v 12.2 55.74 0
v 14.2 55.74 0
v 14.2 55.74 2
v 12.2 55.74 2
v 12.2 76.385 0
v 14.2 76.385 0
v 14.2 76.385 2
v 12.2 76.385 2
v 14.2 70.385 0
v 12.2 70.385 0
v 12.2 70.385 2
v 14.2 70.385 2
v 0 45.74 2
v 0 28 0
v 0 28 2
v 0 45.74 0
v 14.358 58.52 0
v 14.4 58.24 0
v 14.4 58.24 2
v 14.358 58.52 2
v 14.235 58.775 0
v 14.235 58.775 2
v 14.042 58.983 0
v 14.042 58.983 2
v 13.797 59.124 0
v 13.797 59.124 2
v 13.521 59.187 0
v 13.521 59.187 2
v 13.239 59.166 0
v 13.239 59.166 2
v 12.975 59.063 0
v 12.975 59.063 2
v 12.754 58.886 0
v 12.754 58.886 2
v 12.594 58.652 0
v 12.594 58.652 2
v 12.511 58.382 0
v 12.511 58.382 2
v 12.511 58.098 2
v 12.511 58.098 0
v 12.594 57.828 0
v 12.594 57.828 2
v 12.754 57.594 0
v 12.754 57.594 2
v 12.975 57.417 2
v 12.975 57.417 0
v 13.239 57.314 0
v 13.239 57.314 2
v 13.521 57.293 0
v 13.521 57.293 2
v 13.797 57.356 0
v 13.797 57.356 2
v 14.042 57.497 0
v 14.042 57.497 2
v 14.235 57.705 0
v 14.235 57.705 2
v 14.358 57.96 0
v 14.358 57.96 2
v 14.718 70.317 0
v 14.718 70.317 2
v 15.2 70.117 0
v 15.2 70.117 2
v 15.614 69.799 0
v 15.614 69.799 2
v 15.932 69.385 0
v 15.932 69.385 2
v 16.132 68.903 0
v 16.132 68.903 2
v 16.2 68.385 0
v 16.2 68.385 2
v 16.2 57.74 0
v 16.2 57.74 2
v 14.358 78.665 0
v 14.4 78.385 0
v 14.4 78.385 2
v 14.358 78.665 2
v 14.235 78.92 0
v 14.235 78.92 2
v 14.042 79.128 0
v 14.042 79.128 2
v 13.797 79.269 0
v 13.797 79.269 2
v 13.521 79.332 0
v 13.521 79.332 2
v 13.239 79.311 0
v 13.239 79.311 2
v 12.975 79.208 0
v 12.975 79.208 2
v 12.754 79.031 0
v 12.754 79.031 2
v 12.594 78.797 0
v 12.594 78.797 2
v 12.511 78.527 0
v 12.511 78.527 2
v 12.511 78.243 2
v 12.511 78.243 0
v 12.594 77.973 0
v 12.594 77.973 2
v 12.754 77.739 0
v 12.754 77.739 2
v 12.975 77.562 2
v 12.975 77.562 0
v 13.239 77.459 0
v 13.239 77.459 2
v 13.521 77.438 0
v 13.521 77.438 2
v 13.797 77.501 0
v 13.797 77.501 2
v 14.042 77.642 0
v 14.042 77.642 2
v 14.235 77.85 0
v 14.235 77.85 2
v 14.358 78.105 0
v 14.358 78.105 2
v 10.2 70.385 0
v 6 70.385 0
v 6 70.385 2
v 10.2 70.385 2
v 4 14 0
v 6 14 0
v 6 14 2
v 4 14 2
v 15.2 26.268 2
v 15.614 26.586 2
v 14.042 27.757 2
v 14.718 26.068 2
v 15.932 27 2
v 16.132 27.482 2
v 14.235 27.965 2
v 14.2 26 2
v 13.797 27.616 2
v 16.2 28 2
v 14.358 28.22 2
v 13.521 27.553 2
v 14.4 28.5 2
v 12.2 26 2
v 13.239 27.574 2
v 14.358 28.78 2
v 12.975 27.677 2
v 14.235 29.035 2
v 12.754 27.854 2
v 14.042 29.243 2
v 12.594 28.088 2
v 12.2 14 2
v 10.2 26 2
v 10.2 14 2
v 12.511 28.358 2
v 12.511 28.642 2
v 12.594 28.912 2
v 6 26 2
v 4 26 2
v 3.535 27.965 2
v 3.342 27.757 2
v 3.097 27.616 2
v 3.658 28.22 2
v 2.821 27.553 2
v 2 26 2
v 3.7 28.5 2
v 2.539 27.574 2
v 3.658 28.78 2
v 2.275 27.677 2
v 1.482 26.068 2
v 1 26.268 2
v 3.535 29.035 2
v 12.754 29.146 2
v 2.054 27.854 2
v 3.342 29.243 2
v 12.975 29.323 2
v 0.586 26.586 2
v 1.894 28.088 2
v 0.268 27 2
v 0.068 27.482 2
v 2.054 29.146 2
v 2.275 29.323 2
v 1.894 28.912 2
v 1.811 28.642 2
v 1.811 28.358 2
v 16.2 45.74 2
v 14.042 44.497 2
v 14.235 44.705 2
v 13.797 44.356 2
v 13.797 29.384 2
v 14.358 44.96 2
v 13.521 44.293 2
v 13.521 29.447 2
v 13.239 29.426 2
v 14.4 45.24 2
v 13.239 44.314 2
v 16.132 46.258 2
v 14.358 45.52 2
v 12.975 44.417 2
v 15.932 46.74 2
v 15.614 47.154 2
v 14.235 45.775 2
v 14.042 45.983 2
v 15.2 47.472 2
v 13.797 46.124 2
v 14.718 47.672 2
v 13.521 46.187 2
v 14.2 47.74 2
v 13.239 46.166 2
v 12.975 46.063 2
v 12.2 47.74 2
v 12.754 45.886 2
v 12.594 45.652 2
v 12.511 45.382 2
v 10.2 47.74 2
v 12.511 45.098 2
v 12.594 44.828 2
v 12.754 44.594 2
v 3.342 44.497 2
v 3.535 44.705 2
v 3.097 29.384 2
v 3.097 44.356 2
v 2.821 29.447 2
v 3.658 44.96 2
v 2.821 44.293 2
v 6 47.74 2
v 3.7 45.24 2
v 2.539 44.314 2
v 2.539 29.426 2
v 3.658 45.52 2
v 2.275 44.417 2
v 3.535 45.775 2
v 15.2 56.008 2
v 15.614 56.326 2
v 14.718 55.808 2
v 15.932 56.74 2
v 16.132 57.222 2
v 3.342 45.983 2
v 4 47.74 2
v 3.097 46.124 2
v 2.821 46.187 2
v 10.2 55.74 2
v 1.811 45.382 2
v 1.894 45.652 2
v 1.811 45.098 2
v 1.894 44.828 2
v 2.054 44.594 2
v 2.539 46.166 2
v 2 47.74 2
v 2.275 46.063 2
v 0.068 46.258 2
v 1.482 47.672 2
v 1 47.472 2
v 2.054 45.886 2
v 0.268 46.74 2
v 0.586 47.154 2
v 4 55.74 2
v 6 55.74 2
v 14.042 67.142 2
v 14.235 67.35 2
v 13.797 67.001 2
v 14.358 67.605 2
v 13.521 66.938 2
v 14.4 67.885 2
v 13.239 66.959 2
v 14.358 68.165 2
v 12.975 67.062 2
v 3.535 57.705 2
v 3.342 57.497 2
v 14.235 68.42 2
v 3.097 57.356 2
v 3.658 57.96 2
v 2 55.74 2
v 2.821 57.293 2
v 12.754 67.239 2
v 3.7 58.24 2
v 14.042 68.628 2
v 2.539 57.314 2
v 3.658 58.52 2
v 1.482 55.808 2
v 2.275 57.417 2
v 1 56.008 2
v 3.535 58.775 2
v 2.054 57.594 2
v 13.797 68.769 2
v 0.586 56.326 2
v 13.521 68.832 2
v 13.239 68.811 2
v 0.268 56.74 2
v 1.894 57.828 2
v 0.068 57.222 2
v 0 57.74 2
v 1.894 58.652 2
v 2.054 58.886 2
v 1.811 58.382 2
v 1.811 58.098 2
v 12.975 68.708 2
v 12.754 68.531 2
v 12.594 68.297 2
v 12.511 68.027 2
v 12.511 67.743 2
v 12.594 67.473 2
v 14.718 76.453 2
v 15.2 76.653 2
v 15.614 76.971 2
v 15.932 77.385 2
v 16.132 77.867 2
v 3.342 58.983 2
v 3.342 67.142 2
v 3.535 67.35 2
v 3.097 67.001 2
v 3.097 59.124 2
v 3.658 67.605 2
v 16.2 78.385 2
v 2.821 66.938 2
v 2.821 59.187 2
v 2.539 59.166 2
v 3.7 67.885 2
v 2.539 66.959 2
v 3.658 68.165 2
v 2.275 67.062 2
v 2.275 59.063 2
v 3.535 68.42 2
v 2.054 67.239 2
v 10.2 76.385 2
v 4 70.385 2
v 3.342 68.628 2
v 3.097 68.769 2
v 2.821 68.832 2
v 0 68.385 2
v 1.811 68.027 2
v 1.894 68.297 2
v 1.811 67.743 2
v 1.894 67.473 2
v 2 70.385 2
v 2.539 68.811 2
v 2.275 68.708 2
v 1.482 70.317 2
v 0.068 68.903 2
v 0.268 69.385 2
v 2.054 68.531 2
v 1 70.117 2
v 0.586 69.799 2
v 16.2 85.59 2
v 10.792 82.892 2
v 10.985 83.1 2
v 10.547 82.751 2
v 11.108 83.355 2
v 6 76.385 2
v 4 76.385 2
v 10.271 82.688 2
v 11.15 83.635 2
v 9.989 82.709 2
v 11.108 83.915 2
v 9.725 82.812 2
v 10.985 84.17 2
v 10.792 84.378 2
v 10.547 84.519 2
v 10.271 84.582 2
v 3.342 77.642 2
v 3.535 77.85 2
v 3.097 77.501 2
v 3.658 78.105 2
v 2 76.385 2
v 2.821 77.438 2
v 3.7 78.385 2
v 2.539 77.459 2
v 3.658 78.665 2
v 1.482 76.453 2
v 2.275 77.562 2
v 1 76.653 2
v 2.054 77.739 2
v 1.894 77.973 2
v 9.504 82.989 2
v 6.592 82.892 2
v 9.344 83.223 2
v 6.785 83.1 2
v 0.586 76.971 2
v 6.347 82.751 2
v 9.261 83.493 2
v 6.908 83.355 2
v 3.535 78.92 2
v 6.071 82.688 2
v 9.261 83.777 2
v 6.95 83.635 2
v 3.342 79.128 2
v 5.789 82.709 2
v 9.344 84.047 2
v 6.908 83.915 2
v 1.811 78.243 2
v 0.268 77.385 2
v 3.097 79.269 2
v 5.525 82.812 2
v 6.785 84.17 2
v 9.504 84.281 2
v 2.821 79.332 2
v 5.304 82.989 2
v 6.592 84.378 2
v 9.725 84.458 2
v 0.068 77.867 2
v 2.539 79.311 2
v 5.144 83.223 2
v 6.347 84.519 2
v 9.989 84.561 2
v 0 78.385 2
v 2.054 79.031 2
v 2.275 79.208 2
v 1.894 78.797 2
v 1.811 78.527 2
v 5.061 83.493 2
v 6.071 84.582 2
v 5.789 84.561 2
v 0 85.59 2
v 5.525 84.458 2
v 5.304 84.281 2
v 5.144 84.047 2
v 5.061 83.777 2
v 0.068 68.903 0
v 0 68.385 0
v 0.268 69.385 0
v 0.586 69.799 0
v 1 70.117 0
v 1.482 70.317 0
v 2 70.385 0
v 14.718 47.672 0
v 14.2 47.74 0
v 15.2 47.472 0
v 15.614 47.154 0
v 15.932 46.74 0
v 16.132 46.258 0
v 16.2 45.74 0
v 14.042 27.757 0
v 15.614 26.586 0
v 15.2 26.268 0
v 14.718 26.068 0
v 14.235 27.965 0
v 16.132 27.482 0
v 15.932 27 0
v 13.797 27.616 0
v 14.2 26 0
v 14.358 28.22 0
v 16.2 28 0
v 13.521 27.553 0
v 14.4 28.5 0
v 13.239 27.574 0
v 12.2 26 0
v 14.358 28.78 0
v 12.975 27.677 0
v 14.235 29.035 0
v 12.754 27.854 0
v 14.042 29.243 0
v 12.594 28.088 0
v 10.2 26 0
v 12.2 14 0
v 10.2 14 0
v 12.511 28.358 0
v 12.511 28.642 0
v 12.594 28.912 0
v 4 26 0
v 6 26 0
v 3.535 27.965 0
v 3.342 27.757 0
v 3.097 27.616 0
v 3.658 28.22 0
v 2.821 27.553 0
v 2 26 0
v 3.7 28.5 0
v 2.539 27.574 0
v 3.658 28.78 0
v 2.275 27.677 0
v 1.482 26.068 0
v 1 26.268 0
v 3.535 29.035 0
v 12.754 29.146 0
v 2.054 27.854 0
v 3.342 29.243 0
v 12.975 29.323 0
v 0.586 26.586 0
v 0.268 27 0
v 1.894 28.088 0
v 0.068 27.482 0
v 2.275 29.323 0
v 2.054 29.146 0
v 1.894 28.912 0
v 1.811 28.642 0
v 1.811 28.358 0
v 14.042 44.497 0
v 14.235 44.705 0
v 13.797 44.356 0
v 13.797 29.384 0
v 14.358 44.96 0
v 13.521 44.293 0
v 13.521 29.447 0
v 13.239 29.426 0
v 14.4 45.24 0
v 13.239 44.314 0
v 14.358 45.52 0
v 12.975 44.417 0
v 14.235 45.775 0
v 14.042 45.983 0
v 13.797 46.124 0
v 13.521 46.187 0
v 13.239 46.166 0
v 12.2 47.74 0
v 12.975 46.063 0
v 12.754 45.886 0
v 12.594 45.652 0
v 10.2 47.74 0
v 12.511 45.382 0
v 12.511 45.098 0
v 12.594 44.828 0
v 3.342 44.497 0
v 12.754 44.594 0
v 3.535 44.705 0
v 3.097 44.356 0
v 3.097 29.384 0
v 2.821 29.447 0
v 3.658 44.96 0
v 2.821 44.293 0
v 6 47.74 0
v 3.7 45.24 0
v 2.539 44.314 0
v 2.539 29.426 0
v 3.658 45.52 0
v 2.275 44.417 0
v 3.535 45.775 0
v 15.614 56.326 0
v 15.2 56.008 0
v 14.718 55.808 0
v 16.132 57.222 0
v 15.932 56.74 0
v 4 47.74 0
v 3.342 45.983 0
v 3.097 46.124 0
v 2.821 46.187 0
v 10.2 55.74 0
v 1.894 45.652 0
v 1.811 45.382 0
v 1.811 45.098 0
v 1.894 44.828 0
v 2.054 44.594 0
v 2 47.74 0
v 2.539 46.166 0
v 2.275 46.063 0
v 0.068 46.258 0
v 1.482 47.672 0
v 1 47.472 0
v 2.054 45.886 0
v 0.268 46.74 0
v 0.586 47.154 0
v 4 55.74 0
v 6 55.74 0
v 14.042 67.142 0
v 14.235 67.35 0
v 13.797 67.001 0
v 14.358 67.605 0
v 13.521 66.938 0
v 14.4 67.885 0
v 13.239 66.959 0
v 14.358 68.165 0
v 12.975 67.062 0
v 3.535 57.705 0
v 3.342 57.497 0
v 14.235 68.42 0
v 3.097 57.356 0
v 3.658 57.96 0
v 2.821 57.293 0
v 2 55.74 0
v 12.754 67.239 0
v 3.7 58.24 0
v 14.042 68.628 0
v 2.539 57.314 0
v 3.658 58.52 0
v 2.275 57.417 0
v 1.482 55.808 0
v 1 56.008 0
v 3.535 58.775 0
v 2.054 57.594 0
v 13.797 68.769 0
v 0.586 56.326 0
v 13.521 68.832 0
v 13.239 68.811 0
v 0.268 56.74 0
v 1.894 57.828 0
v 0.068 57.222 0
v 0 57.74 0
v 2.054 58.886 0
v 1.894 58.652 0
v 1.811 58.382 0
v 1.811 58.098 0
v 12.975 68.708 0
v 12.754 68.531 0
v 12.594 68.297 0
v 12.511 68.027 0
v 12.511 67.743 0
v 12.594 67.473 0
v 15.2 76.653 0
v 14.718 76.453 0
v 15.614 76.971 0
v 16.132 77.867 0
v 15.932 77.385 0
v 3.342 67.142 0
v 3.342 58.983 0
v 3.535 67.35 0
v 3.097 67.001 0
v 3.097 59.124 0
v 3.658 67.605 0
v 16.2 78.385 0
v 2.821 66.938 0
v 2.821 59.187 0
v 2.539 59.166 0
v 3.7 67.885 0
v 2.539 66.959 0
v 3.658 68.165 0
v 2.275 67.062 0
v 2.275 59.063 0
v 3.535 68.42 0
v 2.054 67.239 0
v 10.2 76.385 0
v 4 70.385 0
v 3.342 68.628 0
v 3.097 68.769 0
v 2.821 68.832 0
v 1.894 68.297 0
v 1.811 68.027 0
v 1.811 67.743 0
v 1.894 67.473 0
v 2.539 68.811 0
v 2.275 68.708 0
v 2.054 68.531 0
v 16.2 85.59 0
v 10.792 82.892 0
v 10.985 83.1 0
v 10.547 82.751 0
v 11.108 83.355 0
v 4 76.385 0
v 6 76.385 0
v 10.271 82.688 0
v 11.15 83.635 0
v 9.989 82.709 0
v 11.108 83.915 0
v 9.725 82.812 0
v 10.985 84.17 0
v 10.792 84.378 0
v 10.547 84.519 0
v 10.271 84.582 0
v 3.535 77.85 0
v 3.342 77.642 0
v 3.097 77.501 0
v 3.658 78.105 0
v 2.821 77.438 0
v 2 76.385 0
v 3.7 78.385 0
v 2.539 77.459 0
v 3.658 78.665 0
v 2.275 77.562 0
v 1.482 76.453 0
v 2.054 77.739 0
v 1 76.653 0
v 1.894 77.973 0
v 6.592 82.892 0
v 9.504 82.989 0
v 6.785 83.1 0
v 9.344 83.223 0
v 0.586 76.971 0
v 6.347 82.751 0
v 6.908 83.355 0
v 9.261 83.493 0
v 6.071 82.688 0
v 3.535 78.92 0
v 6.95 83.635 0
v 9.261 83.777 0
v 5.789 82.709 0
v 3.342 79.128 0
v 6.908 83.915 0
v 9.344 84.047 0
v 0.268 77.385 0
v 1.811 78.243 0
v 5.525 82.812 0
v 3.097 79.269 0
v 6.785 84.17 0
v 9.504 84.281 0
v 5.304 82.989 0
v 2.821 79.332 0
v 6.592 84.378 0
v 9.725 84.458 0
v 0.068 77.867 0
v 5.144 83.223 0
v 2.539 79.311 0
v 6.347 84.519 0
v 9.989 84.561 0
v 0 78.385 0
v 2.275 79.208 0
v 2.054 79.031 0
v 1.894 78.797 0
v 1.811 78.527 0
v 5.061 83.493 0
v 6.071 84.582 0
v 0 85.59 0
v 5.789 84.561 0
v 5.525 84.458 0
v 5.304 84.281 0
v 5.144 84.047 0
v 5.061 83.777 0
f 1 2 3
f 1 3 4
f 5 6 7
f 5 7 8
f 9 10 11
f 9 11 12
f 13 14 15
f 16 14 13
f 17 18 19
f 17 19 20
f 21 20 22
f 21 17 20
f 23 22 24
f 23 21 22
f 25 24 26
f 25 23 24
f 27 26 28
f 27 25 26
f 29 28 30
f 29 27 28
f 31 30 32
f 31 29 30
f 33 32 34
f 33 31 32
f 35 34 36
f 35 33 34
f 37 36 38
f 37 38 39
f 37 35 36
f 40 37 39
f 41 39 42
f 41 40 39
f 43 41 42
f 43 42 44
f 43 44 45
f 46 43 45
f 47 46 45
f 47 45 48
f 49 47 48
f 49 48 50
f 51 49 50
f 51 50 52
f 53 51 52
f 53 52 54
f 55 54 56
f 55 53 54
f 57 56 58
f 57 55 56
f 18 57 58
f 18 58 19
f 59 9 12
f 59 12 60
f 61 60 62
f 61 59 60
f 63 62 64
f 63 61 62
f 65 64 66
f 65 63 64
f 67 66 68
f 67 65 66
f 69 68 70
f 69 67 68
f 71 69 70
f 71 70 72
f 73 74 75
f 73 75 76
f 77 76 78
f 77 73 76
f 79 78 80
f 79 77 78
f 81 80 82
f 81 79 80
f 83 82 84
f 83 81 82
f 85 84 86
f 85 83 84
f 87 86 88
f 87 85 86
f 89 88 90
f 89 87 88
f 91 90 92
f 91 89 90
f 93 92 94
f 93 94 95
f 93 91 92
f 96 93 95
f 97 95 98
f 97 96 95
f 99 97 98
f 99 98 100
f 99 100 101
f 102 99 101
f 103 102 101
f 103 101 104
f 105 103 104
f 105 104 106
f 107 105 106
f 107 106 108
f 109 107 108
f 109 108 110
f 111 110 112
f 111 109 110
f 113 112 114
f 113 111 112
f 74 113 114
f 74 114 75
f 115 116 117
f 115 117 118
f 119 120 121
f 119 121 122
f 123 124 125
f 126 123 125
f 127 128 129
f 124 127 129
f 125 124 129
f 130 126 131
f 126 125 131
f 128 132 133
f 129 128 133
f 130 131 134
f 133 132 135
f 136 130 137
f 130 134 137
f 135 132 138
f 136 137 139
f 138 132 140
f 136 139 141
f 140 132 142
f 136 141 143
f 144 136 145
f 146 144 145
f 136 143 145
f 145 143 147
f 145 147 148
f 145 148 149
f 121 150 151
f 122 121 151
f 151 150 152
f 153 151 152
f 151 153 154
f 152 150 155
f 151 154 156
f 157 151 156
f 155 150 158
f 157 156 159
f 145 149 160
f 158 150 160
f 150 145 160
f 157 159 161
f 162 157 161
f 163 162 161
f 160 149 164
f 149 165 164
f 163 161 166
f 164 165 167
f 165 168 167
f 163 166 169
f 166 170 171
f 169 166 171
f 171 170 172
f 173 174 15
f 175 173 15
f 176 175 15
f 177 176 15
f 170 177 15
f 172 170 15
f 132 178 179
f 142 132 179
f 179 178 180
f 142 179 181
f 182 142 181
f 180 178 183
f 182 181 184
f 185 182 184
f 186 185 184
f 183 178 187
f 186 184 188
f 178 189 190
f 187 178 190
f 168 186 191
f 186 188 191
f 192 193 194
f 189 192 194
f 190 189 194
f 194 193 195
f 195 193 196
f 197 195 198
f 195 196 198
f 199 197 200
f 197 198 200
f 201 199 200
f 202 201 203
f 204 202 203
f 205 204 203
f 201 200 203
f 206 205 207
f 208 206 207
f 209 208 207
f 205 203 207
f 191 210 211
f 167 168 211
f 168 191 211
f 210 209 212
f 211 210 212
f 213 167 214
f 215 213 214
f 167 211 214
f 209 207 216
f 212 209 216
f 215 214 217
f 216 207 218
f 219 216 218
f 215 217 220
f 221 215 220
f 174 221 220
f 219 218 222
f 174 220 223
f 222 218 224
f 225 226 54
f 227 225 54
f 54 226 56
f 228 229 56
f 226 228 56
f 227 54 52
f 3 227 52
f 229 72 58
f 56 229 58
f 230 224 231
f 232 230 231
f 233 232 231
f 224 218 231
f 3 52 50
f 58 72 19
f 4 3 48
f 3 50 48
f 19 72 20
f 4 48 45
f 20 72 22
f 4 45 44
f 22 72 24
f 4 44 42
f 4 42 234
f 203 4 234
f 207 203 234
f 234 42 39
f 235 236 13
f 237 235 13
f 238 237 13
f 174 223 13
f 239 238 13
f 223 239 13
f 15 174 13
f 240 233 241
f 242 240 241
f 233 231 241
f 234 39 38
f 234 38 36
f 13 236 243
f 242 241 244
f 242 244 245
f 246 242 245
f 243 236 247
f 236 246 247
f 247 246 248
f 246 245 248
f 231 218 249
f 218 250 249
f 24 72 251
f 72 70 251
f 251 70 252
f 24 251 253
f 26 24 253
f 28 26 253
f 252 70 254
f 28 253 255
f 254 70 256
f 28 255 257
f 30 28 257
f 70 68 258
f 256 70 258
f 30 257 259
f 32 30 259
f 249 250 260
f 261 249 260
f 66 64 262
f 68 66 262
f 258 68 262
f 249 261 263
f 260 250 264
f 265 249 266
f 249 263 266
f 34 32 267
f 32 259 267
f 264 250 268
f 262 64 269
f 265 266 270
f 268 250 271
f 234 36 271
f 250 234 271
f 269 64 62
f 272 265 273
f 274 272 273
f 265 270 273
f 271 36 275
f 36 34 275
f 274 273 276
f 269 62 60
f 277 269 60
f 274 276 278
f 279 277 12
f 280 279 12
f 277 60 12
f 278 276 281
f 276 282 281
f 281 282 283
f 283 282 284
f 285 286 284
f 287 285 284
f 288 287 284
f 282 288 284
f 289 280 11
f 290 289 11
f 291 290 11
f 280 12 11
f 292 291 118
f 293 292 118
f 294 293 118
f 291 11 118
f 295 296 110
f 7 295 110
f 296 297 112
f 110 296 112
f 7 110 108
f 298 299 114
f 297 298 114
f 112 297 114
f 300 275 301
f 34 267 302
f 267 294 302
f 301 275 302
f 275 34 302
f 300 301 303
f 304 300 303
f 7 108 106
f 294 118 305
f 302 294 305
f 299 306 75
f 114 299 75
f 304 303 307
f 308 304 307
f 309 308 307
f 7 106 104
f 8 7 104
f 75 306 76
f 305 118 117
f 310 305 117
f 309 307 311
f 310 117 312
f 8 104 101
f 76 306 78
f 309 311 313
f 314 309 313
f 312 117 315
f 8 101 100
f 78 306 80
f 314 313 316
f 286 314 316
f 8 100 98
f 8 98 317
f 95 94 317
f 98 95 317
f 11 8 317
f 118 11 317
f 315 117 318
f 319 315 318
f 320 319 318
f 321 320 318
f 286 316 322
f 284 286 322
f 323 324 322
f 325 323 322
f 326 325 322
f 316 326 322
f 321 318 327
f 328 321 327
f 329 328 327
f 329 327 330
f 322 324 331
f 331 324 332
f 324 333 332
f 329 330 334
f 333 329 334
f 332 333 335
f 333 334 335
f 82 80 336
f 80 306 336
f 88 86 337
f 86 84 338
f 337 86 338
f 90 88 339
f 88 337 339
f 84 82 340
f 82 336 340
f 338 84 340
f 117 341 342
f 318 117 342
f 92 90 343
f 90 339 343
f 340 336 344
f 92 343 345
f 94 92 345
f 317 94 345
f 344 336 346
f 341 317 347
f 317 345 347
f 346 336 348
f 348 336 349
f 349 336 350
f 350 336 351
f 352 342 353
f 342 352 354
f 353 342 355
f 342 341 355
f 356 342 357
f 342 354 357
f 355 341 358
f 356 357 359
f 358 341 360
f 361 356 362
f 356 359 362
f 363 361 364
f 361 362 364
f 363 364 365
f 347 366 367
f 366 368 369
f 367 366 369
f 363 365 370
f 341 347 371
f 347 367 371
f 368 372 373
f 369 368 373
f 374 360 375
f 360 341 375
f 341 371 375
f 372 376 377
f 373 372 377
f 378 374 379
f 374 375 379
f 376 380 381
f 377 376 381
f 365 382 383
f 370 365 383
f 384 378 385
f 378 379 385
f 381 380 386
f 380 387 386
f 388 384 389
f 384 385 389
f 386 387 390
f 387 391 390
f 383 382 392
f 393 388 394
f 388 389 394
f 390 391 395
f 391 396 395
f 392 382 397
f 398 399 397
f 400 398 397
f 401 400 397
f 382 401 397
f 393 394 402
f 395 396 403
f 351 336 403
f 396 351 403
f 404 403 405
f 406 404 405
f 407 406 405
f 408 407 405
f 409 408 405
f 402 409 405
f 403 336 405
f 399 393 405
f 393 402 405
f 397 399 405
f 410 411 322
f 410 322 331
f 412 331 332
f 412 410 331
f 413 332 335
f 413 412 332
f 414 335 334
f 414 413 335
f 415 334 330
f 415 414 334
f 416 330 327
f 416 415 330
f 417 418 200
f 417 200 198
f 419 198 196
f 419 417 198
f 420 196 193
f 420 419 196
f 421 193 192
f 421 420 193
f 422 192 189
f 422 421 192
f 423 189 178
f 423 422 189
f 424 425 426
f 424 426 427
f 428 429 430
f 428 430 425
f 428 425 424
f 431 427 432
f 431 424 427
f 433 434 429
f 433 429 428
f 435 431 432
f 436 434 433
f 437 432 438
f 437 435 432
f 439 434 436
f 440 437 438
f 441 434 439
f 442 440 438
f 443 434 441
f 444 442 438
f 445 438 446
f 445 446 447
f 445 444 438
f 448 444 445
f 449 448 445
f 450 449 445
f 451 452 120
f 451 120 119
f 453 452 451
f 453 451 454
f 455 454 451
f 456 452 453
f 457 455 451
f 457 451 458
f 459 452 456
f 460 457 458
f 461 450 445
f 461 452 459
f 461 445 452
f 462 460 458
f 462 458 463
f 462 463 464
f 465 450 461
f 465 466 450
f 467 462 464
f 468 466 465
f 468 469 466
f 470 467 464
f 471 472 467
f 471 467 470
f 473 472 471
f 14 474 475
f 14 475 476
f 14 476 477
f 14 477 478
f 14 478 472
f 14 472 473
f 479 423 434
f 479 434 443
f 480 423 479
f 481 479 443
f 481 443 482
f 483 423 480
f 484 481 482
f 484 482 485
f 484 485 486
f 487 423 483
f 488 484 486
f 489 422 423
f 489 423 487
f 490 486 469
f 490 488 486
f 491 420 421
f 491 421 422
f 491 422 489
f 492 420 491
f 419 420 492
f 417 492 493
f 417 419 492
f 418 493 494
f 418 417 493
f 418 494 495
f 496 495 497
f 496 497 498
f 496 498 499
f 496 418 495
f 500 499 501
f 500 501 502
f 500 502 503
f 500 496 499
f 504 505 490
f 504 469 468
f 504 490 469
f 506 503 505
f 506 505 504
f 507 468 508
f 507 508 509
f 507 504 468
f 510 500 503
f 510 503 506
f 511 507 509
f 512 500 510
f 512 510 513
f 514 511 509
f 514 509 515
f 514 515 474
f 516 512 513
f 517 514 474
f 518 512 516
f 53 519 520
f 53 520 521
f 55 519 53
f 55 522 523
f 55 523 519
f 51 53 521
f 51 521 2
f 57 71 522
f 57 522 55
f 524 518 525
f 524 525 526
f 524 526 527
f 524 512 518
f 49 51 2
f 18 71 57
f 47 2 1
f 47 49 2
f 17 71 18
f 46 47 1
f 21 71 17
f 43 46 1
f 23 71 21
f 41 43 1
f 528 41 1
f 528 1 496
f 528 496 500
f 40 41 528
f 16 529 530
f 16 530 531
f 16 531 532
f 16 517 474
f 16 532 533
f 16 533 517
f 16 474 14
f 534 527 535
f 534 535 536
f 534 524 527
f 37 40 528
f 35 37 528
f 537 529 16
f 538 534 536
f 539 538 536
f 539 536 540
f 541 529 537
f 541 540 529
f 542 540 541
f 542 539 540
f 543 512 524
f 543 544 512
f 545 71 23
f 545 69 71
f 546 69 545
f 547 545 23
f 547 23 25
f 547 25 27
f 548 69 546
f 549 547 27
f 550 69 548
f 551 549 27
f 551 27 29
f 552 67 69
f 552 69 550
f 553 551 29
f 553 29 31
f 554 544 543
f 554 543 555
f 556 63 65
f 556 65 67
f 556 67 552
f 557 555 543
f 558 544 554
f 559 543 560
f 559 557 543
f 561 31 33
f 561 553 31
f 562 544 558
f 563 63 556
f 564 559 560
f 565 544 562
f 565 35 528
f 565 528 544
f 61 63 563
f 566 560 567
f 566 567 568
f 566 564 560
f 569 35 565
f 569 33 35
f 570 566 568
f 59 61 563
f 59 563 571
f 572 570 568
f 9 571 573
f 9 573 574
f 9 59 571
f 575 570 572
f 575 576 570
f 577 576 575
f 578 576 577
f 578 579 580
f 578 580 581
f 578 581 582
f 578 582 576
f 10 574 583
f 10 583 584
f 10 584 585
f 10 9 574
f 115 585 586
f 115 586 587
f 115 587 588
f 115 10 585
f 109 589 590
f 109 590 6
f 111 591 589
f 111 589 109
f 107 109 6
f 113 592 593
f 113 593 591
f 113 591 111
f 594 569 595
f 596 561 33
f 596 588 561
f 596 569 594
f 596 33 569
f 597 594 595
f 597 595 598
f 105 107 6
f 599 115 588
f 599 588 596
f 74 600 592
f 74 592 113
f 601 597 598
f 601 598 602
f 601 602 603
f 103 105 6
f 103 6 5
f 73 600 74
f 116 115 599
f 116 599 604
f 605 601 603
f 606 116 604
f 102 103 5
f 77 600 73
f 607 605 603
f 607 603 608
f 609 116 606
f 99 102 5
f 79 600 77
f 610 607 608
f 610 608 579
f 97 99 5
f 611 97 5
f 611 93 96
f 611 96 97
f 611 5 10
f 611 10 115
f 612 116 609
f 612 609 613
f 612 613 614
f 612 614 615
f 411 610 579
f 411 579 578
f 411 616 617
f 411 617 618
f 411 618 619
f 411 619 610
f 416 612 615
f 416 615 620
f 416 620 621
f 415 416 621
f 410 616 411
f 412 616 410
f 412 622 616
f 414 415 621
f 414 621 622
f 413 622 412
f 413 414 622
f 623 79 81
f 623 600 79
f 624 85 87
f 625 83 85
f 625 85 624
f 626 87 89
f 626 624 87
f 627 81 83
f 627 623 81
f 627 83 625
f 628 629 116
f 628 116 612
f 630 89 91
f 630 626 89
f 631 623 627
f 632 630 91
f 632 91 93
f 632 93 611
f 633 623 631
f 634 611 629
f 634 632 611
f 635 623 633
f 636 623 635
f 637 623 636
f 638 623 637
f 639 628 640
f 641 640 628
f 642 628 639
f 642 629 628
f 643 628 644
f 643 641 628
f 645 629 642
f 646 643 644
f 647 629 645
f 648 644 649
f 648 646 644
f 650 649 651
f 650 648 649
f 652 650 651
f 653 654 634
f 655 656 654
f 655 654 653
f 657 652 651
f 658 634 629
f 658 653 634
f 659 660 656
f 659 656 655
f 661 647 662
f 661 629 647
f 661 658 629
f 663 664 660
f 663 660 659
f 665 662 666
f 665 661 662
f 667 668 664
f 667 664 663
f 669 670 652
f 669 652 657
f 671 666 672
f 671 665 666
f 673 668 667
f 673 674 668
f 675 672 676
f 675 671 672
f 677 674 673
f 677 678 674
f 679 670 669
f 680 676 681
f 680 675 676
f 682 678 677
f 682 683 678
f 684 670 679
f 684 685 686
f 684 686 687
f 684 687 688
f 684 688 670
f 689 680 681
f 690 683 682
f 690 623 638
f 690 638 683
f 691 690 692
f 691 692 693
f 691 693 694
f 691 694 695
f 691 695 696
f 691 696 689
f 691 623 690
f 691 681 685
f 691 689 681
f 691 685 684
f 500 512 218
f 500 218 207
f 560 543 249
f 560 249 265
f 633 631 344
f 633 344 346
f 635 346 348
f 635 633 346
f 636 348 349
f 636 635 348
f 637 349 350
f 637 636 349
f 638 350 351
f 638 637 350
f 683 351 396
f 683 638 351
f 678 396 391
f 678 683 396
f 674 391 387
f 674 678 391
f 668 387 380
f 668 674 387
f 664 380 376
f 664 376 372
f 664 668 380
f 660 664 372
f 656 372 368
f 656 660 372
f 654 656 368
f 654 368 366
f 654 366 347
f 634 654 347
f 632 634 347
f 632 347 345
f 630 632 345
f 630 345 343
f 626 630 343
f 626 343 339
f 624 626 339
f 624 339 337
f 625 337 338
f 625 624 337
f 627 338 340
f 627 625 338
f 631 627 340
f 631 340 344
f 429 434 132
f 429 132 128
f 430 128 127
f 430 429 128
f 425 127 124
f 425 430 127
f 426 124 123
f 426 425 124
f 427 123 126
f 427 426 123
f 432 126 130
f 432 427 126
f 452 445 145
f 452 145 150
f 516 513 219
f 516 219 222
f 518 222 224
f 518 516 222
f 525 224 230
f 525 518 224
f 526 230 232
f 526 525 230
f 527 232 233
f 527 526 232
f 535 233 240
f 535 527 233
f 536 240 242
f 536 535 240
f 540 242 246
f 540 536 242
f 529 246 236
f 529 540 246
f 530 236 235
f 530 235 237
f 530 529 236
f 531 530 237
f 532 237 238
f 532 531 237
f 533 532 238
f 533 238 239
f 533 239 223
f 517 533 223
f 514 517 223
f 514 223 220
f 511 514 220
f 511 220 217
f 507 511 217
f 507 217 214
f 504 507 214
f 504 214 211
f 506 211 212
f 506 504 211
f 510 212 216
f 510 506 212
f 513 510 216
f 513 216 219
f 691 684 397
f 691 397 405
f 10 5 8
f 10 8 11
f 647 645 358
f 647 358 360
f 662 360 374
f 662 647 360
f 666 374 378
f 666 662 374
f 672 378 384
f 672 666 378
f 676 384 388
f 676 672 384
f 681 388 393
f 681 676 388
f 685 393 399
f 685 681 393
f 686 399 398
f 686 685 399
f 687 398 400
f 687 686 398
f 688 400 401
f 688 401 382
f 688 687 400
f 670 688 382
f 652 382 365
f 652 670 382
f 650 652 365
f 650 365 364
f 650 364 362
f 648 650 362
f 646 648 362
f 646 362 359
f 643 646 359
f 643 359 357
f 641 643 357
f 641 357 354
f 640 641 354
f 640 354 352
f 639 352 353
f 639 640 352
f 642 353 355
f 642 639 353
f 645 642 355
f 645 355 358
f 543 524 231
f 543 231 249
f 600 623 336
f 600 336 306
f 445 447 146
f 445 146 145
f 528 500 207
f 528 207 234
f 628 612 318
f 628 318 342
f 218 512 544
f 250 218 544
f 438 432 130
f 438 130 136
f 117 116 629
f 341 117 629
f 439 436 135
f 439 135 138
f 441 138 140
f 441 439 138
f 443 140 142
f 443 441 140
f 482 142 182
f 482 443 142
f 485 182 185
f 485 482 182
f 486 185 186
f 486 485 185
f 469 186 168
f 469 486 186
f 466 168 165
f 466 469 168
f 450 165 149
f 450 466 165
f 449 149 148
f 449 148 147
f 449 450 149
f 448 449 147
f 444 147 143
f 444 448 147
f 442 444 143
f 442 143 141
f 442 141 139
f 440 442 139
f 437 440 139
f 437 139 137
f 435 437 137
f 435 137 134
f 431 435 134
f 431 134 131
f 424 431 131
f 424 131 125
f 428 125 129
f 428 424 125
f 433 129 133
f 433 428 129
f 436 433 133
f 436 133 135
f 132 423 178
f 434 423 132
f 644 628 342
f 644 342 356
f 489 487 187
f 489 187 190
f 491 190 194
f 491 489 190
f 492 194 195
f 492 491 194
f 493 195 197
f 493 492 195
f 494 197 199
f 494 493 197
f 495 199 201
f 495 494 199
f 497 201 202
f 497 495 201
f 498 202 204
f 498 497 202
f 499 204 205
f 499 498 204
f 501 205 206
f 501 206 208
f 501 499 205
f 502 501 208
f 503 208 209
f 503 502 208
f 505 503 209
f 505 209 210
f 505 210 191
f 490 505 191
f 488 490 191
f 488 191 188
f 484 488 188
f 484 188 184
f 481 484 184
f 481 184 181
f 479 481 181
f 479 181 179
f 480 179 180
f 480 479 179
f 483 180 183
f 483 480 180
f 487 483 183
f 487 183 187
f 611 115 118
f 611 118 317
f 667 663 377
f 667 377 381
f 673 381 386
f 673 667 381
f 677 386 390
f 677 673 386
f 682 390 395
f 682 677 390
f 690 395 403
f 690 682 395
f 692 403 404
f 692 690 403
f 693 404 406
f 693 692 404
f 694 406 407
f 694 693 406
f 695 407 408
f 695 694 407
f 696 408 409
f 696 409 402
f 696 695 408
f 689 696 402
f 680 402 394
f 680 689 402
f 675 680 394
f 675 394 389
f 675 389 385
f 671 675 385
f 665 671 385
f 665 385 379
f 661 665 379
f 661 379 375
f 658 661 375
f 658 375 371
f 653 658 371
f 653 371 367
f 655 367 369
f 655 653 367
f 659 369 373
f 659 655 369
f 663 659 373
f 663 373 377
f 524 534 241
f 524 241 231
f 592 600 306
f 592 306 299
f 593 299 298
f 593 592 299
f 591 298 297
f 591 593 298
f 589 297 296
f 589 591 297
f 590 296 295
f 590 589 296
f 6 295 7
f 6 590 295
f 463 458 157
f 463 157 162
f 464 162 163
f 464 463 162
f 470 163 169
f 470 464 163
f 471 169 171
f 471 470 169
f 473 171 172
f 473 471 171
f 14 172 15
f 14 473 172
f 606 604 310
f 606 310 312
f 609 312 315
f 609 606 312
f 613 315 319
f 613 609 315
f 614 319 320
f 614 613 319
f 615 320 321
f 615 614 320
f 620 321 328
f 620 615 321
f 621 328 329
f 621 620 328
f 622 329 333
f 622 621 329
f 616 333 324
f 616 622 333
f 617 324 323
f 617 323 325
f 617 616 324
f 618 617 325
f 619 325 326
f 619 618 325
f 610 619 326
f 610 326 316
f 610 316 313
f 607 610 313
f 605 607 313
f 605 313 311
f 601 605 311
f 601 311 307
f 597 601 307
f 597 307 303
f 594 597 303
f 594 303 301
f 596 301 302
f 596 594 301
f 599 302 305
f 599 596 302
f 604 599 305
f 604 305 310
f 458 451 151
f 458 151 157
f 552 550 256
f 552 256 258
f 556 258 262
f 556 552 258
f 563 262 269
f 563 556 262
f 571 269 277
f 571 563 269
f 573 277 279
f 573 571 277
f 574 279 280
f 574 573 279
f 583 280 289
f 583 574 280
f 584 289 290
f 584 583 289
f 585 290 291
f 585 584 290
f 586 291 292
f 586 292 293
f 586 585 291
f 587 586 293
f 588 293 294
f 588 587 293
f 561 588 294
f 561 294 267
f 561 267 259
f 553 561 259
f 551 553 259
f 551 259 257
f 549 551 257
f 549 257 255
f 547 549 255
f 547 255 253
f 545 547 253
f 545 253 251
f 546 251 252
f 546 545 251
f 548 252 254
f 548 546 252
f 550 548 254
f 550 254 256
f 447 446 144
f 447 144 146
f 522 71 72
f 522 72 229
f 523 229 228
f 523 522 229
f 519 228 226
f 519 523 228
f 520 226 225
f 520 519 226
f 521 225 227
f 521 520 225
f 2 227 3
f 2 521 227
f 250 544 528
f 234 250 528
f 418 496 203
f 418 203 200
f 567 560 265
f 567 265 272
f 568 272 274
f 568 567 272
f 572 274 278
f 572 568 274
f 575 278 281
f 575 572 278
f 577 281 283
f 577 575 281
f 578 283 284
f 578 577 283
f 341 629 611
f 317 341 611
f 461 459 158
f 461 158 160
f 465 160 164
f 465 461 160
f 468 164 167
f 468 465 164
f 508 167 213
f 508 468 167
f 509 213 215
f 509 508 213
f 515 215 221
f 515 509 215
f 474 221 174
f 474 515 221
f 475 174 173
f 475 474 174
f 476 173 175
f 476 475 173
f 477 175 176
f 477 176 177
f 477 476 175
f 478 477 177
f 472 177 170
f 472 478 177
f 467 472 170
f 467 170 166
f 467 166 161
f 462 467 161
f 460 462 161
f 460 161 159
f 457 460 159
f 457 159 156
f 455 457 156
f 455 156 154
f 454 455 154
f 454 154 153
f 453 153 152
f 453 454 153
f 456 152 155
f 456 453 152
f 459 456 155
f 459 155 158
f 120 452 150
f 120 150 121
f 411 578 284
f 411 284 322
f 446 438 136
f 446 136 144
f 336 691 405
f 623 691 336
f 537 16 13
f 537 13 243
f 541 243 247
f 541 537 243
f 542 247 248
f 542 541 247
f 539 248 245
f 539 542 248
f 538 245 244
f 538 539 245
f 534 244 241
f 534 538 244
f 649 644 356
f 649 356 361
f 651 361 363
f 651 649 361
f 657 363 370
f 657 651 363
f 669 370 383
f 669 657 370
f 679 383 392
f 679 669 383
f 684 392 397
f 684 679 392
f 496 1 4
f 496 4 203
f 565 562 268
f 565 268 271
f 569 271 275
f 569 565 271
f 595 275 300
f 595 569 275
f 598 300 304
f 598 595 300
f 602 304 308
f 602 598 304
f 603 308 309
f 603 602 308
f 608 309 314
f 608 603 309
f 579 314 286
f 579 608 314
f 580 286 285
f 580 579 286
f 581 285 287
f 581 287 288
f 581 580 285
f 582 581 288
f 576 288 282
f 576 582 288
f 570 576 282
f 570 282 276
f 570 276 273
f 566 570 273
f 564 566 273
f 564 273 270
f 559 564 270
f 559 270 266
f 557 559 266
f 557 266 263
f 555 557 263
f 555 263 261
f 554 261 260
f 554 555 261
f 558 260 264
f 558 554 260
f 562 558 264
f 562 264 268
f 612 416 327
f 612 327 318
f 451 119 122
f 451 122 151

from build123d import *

# Parameters (mm, degrees)
SKETCH1_R           = 0.95
SKETCH1_W           = 4.2
SKETCH1_H           = 6
SKETCH1_H_2         = 8
BOSS_EXTRUDE1_DEPTH = 2


with BuildPart() as part:
    # Sketch1 → Boss-Extrude1 (new body)
    with BuildSketch(Plane.XY):
        with BuildLine():
            Line((2, 47.74), (4, 47.74))
            Line((4, 47.74), (4, 55.74))
            Line((4, 55.74), (2, 55.74))
            ThreePointArc((2, 55.74), (0.585786438, 56.325786438), (0, 57.74))
            Line((0, 57.74), (0, 68.385))
            ThreePointArc((0, 68.385), (0.585786438, 69.799213562), (2, 70.385))
            Line((2, 70.385), (4, 70.385))
            Line((4, 70.385), (4, 76.385))
            Line((4, 76.385), (2, 76.385))
            ThreePointArc((2, 76.385), (0.585786438, 76.970786438), (0, 78.385))
            Line((0, 78.385), (0, 85.59))
            Line((0, 85.59), (16.2, 85.59))
            Line((16.2, 85.59), (16.2, 78.385))
            ThreePointArc((16.2, 78.385), (15.614213562, 76.970786438), (14.2, 76.385))
            Line((14.2, 76.385), (12.2, 76.385))
            Line((12.2, 76.385), (12.2, 70.385))
            Line((12.2, 70.385), (14.2, 70.385))
            ThreePointArc((14.2, 70.385), (15.614213562, 69.799213562), (16.2, 68.385))
            Line((16.2, 68.385), (16.2, 57.74))
            ThreePointArc((16.2, 57.74), (15.614213562, 56.325786438), (14.2, 55.74))
            Line((14.2, 55.74), (12.2, 55.74))
            Line((12.2, 55.74), (12.2, 47.74))
            Line((12.2, 47.74), (14.2, 47.74))
            ThreePointArc((14.2, 47.74), (15.614213562, 47.154213562), (16.2, 45.74))
            Line((16.2, 45.74), (16.2, 28))
            ThreePointArc((16.2, 28), (15.614213562, 26.585786438), (14.2, 26))
            Line((14.2, 26), (12.2, 26))
            Line((12.2, 26), (12.2, 14))
            Line((12.2, 14), (10.2, 14))
            Line((10.2, 14), (10.2, 26))
            Line((10.2, 26), (6, 26))
            Line((6, 26), (6, 14))
            Line((6, 14), (4, 14))
            Line((4, 14), (4, 26))
            Line((4, 26), (2, 26))
            ThreePointArc((2, 26), (0.585786438, 26.585786438), (0, 28))
            Line((0, 28), (0, 45.74))
            ThreePointArc((0, 45.74), (0.585786438, 47.154213562), (2, 47.74))
        make_face()
        with Locations((13.45, 45.24)):
            Circle(SKETCH1_R, mode=Mode.SUBTRACT)
        with Locations((2.75, 67.885)):
            Circle(SKETCH1_R, mode=Mode.SUBTRACT)
        with Locations((13.45, 58.24)):
            Circle(SKETCH1_R, mode=Mode.SUBTRACT)
        with Locations((13.45, 78.385)):
            Circle(SKETCH1_R, mode=Mode.SUBTRACT)
        with Locations((2.75, 28.5)):
            Circle(SKETCH1_R, mode=Mode.SUBTRACT)
        with Locations((2.75, 78.385)):
            Circle(SKETCH1_R, mode=Mode.SUBTRACT)
        with Locations((2.75, 58.24)):
            Circle(SKETCH1_R, mode=Mode.SUBTRACT)
        with Locations((6, 83.635)):
            Circle(SKETCH1_R, mode=Mode.SUBTRACT)
        with Locations((13.45, 28.5)):
            Circle(SKETCH1_R, mode=Mode.SUBTRACT)
        with Locations((13.45, 67.885)):
            Circle(SKETCH1_R, mode=Mode.SUBTRACT)
        with Locations((10.2, 83.635)):
            Circle(SKETCH1_R, mode=Mode.SUBTRACT)
        with Locations((2.75, 45.24)):
            Circle(SKETCH1_R, mode=Mode.SUBTRACT)
        with Locations((8.1, 73.385)):
            Rectangle(SKETCH1_W, SKETCH1_H, mode=Mode.SUBTRACT)
        with Locations((8.1, 51.74)):
            Rectangle(SKETCH1_W, SKETCH1_H_2, mode=Mode.SUBTRACT)
    extrude(amount=BOSS_EXTRUDE1_DEPTH)


solid = part.part
